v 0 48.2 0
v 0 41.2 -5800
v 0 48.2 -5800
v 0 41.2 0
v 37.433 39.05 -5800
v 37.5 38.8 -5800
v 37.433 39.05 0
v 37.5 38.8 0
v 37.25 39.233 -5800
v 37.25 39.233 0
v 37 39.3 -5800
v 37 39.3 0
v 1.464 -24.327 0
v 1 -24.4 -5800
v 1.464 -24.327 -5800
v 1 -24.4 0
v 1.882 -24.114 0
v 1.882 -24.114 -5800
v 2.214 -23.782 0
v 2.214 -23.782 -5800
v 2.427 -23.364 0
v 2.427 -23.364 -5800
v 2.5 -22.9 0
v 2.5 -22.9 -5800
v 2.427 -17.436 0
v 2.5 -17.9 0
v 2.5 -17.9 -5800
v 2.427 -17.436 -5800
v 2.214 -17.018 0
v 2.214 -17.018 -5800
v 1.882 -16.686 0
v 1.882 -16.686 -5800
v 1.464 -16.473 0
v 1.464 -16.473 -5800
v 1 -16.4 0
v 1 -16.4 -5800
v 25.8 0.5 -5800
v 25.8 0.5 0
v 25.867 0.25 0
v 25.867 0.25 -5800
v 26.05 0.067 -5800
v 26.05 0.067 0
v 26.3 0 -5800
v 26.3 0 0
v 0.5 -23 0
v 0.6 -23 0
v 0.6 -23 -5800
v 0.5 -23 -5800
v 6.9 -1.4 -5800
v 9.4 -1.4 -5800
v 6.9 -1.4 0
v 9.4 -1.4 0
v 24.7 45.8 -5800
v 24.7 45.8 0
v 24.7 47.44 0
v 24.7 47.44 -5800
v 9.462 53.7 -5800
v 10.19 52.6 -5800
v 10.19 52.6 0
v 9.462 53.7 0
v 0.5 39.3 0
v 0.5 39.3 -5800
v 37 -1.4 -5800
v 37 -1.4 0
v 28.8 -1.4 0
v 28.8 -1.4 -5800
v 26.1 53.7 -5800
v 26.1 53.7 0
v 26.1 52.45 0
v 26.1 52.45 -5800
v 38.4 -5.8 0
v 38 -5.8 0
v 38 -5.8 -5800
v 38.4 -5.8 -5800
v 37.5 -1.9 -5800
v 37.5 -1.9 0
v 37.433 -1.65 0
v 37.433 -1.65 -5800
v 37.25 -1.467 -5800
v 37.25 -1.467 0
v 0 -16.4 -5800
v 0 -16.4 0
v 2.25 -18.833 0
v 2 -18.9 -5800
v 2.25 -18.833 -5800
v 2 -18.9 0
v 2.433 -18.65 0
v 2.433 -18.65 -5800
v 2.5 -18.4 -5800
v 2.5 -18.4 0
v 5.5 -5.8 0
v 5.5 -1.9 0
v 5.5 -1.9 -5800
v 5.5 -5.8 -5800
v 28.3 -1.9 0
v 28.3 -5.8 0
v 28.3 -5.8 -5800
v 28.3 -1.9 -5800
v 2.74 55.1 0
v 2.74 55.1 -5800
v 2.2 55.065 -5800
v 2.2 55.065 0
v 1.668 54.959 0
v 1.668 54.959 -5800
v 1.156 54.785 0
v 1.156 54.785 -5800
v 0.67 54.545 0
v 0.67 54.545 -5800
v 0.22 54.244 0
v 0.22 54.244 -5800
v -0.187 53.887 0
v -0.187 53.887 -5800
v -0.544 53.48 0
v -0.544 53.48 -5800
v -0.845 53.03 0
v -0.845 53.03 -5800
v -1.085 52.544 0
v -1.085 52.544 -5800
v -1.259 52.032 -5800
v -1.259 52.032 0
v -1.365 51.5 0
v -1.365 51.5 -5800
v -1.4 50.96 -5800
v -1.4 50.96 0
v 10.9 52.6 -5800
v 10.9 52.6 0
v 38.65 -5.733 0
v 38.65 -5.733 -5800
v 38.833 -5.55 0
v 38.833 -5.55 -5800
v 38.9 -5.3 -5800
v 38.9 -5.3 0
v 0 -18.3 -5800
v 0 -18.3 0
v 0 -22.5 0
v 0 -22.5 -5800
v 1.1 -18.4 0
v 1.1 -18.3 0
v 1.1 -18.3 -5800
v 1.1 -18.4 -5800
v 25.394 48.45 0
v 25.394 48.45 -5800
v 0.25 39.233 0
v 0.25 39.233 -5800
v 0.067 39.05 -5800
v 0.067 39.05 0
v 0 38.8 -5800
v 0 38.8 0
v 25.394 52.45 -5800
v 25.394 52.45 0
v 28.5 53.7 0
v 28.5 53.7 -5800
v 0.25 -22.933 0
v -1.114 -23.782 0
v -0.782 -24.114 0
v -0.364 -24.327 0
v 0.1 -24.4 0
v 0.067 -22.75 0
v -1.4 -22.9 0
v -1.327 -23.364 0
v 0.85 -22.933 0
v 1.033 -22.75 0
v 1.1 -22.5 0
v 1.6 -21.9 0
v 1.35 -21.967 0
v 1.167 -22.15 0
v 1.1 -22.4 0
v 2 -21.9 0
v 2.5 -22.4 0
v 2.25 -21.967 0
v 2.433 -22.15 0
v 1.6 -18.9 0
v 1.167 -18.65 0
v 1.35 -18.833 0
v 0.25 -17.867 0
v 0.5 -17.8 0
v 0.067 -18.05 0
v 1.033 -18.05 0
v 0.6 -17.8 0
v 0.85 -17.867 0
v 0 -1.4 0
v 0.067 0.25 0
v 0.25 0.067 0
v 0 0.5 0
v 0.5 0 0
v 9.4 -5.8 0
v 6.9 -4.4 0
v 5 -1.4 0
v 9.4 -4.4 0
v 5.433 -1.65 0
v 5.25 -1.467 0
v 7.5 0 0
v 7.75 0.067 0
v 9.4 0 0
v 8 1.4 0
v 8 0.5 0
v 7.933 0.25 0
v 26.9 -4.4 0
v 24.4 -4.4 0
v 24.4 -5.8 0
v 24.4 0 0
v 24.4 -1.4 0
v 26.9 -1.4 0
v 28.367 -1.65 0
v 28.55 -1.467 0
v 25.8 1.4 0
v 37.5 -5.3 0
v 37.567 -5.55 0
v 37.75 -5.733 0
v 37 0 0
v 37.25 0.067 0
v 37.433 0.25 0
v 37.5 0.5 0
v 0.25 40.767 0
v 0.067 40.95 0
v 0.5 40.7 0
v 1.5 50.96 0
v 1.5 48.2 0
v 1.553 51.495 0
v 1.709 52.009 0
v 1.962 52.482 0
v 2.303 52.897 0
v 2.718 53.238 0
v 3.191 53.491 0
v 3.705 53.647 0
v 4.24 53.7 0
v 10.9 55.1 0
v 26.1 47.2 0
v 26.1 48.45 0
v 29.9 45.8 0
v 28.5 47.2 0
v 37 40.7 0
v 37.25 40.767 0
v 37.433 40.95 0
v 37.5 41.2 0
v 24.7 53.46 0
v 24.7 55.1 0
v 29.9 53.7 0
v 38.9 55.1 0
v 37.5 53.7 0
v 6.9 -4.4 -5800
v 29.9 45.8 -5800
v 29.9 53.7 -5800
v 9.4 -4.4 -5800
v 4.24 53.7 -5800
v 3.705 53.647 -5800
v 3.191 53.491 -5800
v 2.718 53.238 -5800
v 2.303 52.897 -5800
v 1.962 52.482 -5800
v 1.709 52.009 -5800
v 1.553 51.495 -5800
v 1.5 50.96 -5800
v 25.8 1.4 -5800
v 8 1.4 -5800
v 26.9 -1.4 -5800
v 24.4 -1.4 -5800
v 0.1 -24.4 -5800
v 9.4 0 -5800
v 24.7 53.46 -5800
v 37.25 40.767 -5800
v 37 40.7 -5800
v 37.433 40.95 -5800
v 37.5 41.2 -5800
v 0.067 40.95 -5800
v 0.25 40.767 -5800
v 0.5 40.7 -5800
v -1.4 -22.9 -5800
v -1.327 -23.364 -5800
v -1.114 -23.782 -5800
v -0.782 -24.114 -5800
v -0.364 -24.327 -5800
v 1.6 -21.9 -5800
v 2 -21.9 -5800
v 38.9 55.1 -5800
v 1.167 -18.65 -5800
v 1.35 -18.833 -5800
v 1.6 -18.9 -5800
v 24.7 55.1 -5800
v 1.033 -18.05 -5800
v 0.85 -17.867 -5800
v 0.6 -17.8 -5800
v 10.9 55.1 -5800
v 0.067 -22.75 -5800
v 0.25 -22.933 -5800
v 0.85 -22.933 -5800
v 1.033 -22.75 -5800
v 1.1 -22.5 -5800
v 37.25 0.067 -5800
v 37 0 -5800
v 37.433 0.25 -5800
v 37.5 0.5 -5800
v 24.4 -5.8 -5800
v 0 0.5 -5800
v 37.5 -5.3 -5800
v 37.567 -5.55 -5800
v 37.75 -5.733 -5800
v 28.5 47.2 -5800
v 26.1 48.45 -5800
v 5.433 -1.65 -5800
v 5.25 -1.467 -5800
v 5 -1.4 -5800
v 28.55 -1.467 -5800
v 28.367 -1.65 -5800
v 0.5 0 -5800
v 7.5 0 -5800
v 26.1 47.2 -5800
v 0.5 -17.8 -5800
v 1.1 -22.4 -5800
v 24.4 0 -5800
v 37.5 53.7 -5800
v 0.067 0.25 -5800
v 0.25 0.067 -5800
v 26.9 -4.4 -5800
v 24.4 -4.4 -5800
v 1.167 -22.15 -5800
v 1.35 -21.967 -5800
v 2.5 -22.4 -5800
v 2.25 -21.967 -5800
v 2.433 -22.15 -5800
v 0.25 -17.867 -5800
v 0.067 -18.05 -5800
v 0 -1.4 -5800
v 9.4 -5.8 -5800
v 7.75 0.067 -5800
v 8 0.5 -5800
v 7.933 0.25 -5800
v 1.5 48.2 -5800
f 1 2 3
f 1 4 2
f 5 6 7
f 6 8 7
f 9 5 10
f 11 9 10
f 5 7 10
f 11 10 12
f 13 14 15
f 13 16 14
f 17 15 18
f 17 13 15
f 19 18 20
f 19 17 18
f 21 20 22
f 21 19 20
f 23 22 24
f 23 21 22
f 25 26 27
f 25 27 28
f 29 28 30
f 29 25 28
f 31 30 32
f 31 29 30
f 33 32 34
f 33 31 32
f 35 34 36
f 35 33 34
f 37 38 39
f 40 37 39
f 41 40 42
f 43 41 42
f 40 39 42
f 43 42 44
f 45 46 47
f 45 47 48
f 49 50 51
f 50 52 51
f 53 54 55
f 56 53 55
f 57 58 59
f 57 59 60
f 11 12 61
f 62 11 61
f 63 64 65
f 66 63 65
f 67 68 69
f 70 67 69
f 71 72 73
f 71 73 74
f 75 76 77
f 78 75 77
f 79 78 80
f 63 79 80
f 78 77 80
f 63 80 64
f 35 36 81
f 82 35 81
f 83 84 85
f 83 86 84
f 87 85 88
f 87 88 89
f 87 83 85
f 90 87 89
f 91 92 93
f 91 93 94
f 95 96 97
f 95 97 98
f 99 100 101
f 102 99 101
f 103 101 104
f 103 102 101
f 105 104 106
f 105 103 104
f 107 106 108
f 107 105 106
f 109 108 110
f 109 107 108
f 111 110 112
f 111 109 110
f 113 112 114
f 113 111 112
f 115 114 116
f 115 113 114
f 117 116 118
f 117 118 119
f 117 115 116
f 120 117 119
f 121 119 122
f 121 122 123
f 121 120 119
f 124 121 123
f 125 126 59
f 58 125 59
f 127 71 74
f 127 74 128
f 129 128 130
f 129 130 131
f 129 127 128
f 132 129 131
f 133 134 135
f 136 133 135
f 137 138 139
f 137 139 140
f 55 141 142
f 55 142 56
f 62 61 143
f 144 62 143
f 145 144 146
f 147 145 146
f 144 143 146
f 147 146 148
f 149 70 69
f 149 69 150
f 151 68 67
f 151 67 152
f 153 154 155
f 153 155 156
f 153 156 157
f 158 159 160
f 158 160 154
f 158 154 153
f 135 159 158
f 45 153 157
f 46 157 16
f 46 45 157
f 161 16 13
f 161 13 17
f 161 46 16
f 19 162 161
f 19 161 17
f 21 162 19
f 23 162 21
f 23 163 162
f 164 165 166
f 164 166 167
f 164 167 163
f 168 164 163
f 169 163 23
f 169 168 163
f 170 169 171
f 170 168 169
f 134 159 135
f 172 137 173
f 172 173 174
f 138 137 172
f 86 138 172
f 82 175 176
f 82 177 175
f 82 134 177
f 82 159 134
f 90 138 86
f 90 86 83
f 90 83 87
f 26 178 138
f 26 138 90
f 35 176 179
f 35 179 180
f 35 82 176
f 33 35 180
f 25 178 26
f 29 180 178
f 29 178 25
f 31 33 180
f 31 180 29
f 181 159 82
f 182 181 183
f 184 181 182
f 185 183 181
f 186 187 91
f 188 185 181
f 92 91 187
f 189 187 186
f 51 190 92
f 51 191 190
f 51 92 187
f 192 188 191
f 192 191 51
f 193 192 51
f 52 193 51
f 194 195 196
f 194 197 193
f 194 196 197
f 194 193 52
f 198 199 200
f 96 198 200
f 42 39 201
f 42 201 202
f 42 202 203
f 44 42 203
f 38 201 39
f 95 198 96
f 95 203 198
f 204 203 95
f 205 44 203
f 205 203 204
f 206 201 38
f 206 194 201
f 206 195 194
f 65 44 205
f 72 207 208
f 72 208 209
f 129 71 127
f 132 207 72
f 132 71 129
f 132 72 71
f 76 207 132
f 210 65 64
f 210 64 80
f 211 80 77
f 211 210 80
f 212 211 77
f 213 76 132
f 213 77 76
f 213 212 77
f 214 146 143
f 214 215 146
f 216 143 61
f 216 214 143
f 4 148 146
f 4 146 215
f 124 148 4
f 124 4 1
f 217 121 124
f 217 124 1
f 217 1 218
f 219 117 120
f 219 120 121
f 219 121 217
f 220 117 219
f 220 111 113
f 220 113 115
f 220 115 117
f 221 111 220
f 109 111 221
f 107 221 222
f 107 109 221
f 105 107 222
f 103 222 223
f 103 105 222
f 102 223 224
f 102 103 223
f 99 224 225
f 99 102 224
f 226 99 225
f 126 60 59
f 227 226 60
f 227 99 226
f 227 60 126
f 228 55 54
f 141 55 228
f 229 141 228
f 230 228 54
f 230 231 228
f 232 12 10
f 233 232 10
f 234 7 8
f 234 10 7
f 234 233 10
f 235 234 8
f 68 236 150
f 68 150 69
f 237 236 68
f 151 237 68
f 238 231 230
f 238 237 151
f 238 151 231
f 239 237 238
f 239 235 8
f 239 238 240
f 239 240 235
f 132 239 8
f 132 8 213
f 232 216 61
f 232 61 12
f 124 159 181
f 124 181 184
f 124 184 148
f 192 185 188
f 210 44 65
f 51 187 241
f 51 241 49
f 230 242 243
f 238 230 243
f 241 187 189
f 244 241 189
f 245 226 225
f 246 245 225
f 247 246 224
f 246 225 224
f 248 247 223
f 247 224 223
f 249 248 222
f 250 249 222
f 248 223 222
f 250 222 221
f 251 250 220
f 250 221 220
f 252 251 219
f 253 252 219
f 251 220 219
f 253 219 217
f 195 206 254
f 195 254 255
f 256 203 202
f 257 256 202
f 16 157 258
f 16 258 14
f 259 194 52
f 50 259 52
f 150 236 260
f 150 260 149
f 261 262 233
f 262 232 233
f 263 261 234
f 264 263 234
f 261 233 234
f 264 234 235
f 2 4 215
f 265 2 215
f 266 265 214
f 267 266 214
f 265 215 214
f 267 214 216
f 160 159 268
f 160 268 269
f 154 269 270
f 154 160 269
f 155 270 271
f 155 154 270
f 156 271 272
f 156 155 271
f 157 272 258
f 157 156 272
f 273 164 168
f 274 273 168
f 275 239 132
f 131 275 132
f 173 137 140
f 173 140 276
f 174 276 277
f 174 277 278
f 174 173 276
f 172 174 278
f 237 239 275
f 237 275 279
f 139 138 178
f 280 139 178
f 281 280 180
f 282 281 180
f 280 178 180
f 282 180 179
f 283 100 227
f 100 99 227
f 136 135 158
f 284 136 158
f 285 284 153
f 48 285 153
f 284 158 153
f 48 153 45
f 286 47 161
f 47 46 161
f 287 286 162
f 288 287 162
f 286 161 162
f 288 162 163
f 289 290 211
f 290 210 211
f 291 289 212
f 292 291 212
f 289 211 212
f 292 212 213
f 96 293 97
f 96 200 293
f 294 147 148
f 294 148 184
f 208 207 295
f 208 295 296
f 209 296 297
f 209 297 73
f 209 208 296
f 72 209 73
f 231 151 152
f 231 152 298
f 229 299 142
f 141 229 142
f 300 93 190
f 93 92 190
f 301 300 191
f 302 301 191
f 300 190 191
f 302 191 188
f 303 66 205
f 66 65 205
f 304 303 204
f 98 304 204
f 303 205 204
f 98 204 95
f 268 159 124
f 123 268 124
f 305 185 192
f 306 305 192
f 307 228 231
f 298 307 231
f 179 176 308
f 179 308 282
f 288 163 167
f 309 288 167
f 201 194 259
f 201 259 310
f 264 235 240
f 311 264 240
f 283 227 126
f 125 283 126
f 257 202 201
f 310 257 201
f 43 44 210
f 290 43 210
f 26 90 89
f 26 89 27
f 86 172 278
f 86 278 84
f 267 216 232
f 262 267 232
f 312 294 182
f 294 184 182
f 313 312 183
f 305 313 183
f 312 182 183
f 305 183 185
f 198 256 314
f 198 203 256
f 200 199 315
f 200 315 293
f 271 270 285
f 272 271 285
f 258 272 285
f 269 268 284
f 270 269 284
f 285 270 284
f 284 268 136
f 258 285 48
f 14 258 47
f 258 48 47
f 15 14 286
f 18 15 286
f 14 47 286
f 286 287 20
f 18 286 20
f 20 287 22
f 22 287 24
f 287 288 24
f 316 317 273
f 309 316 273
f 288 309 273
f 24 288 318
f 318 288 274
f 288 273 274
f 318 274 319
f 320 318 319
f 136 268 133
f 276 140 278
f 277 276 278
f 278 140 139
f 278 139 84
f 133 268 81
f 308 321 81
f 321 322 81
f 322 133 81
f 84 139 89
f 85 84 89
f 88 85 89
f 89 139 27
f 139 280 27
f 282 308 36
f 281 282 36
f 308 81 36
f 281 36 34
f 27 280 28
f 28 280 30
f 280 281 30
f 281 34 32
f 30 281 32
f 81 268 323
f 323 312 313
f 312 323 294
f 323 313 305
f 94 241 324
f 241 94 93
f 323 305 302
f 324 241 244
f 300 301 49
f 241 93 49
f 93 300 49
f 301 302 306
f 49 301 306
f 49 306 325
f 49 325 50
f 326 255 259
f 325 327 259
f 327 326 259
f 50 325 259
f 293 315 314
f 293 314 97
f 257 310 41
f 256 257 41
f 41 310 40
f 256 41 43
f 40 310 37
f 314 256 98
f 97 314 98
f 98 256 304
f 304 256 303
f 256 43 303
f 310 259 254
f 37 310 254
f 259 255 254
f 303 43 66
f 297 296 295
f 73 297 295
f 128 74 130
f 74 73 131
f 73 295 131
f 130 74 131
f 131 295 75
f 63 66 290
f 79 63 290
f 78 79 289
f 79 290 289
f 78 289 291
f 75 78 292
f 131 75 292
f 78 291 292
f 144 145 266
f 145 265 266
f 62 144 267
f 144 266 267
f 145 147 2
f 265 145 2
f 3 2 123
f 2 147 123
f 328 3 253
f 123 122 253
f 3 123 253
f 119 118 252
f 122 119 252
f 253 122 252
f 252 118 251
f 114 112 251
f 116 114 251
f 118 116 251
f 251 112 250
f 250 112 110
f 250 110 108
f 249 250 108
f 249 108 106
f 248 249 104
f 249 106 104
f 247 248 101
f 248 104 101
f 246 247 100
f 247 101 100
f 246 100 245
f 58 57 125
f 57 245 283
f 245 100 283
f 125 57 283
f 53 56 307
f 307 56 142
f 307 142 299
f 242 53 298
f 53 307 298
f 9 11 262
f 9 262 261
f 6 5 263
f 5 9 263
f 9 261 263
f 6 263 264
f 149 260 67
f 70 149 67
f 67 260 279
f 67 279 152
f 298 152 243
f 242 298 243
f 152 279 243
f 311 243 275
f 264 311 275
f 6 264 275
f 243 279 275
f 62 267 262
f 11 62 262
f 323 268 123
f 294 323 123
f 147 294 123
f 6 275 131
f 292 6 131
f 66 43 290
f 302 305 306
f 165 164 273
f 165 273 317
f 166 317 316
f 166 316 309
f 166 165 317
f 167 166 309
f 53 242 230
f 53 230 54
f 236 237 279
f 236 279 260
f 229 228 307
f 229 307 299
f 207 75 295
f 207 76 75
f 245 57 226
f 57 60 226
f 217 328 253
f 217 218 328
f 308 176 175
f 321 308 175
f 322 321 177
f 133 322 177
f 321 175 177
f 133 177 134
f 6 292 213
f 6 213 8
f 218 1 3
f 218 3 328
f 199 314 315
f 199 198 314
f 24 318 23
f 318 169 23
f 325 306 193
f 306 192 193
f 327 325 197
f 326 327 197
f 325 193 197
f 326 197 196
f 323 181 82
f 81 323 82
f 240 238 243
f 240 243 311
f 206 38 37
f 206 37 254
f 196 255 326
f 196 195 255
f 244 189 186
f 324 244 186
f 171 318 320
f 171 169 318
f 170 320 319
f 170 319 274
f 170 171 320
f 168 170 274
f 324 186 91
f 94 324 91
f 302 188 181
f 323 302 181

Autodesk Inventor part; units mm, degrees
ref_plane "YZ Plane" through (0, 0, 0) normal (1, 0, 0) x (0, 1, 0)
ref_plane "XZ Plane" through (0, 0, 0) normal (0, 1, 0) x (-1, 0, 0)
ref_plane "XY Plane" through (0, 0, 0) normal (0, 0, 1) x (1, 0, 0)
sketch "Boceto1" plane through (0, 0, 0) normal (0, 0, 1) x (1, 0, 0)
  line L0 (37.5, 0.5) -> (37.5, 38.8)
  line L1 (37, 39.3) -> (0.5, 39.3)
  line L2 (0, 38.8) -> (0, 0.5)
  line L3 (0.5, 40.7) -> (37, 40.7)
  line L4 (38.9, 55.1) -> (38.9, -5.3)
  line L5 (-1.4, -22.9) -> (-1.4, 50.96)
  line L6 (37.5, 41.2) -> (37.5, 53.7)
  line L7 (38.9, 55.1) -> (24.7, 55.1)
  line L8 (24.7, 55.1) -> (24.7, 53.46)
  line L9 (28.5, 53.7) -> (28.5, 47.2)
  line L10 (29.9, 45.8) -> (29.9, 53.7)
  line L11 (29.9, 45.8) -> (24.7, 45.8)
  line L12 (24.7, 45.8) -> (24.7, 47.44)
  line L13 (26.1, 47.2) -> (28.5, 47.2)
  line L14 (26.1, 48.45) -> (25.3942, 48.45)
  line L15 (25.3942, 48.45) -> (24.7, 47.44)
  line L16 (26.1, 52.45) -> (25.3942, 52.45)
  line L17 (0, 41.2) -> (0, 48.2)
  line L18 (0, 48.2) -> (1.5, 48.2)
  line L19 (1.5, 48.2) -> (1.5, 50.96)
  line L20 (2.74, 55.1) -> (10.9, 55.1)
  line L21 (9.4619, 53.7) -> (4.24, 53.7)
  line L22 (10.9, 55.1) -> (10.9, 52.6)
  line L23 (10.9, 52.6) -> (10.19, 52.6)
  line L24 (10.19, 52.6) -> (9.4619, 53.7)
  line L25 (0, -24.4) -> (0.1, -24.4)
  line L26 (37.5, -1.9) -> (37.5, -5.3)
  line L27 (38, -5.8) -> (38.4, -5.8)
  line L28 (26.9, -1.4) -> (26.9, -4.4)
  line L29 (28.3, -5.8) -> (28.3, -1.9)
  line L30 (5.5, -1.9) -> (5.5, -5.8)
  line L31 (6.9, -4.4) -> (6.9, -1.4)
  line L32 (6.9, -4.4) -> (9.4, -4.4)
  line L33 (9.4, -4.4) -> (9.4, -5.8)
  line L34 (9.4, -5.8) -> (5.5, -5.8)
  line L35 (26.9, -4.4) -> (24.4, -4.4)
  line L36 (24.4, -4.4) -> (24.4, -5.8)
  line L37 (24.4, -5.8) -> (28.3, -5.8)
  line L38 (25.8, 0.5) -> (25.8, 1.4)
  line L39 (25.8, 1.4) -> (8, 1.4)
  line L40 (0.5, 0) -> (7.5, 0)
  line L41 (26.3, 0) -> (37, 0)
  line L42 (24.4, -1.4) -> (24.4, 0)
  line L43 (9.4, 0) -> (9.4, -1.4)
  line L44 (26.1, 53.7) -> (28.5, 53.7)
  line L45 (29.9, 53.7) -> (37.5, 53.7)
  line L46 (37, -1.4) -> (28.8, -1.4)
  line L47 (9.4, -1.4) -> (6.9, -1.4)
  line L48 (5, -1.4) -> (0, -1.4)
  arc A0 (4.24, 53.7) -> (1.5, 50.96) centre (4.24, 50.96) ccw
  arc A1 (2.74, 55.1) -> (-1.4, 50.96) centre (2.74, 50.96) ccw
  line L49 (26.9, -1.4) -> (24.4, -1.4)
  line L50 (26.9, -1.4) -> (24.4, -1.4)
  line L51 (8, 1.4) -> (8, 0.5)
  line L52 (9.4, 0) -> (24.4, 0)
  line L53 (24.7, 53.46) -> (25.3942, 52.45)
  line L54 (26.1, 53.7) -> (26.1, 52.45)
  line L55 (26.1, 47.2) -> (26.1, 48.45)
  line L56 (0, -24.4) -> (1, -24.4)
  line L57 (0.6, -23) -> (0.5, -23)
  line L58 (0.5, -17.8) -> (0.6, -17.8)
  line L59 (1, -16.4) -> (0, -16.4)
  line L60 (1.1, -18.3) -> (1.1, -18.4)
  line L61 (1.6, -18.9) -> (2, -18.9)
  line L62 (2.5, -18.4) -> (2.5, -17.9)
  line L63 (1.1, -22.5) -> (1.1, -22.4)
  line L64 (1.6, -21.9) -> (2, -21.9)
  line L65 (2.5, -22.4) -> (2.5, -22.9)
  line L66 (0, -1.4) -> (0, -16.4)
  line L67 (0, -18.3) -> (0, -22.5)
  arc A2 (2.5, -17.9) -> (1, -16.4) centre (1, -17.9) ccw
  arc A3 (1, -24.4) -> (2.5, -22.9) centre (1, -22.9) ccw
  arc A4 (-1.4, -22.9) -> (0.1, -24.4) centre (0.1, -22.9) ccw
  arc A5 (1.1, -18.4) -> (1.6, -18.9) centre (1.6, -18.4) ccw
  arc A6 (1.1, -18.3) -> (0.6, -17.8) centre (0.6, -18.3) ccw
  arc A7 (2, -18.9) -> (2.5, -18.4) centre (2, -18.4) ccw
  arc A8 (2.5, -22.4) -> (2, -21.9) centre (2, -22.4) ccw
  arc A9 (1.6, -21.9) -> (1.1, -22.4) centre (1.6, -22.4) ccw
  arc A10 (0.6, -23) -> (1.1, -22.5) centre (0.6, -22.5) ccw
  arc A11 (5.5, -1.9) -> (5, -1.4) centre (5, -1.9) ccw
  arc A12 (7.5, 0) -> (8, 0.5) centre (7.5, 0.5) ccw
  arc A13 (0, 0.5) -> (0.5, 0) centre (0.5, 0.5) ccw
  arc A14 (28.8, -1.4) -> (28.3, -1.9) centre (28.8, -1.9) ccw
  arc A15 (25.8, 0.5) -> (26.3, 0) centre (26.3, 0.5) ccw
  arc A16 (37, 0) -> (37.5, 0.5) centre (37, 0.5) ccw
  arc A17 (37.5, -1.9) -> (37, -1.4) centre (37, -1.9) ccw
  arc A18 (37.5, -5.3) -> (38, -5.8) centre (38, -5.3) ccw
  arc A19 (38.4, -5.8) -> (38.9, -5.3) centre (38.4, -5.3) ccw
  arc A20 (0.5, 39.3) -> (0, 38.8) centre (0.5, 38.8) ccw
  arc A21 (37.5, 38.8) -> (37, 39.3) centre (37, 38.8) ccw
  arc A22 (37, 40.7) -> (37.5, 41.2) centre (37, 41.2) ccw
  arc A23 (0, 41.2) -> (0.5, 40.7) centre (0.5, 41.2) ccw
  arc A24 (0, -22.5) -> (0.5, -23) centre (0.5, -22.5) ccw
  arc A25 (0.5, -17.8) -> (0, -18.3) centre (0.5, -18.3) ccw
  point P0 (0, 0)
  point P1 (9.4, -5.1)
  point P2 (27.3, 45.8)
  point P3 (28.5, 50.45)
  point P4 (0, -23)
  point P5 (0, -17.8)
  point P6 (1.1, -21.9)
  point P7 (0, -20.4)
  dimension "d10" = 60.9
  dimension "d11" = 23
  dimension "d13" = 39.3
  dimension "d14" = 1.4
  dimension "d15" = 1.4
  dimension "d17" = 1.4
  dimension "d18" = 1.4
  dimension "d20" = 1.4
  dimension "d22" = 1.4
  dimension "d23" = 1.4
  dimension "d26" = 1.4
  dimension "d27" = 1.4
  dimension "d28" = 1.4
  dimension "d31" = 1.4
  dimension "d34" = 40.3
  dimension "d35" = 37.9
  dimension "d36" = 39.3
  dimension "d37" = 37.5
  dimension "d38" = 37.5
  dimension "d40" = 14.2
  dimension "d41" = 13.8
  dimension "d42" = 2.5
  dimension "d43" = 0.71
  dimension "d45" = 2.9
  dimension "d46" = 14.4
  dimension "d47" = 33.5
  dimension "d48" = 7.5
  dimension "d49" = 79.5
  dimension "d51" = 2.74
  dimension "d58" = 4.14
  dimension "d59" = 6.9
  dimension "d60" = 1.4
  dimension "d61" = 20
  dimension "d62" = 6.9
  dimension "d64" = 1.4
  dimension "d65" = 3
  dimension "d66" = 3
  dimension "d68" = 2.5
  dimension "d69" = 2.5
  dimension "d70" = 15
  dimension "d71" = 2.5
  dimension "d73" = 1.4
  dimension "d74" = 1.4
  dimension "d75" = 1.4
  dimension "d76" = 1.4
  dimension "d82" = 1.4
  dimension "d83" = 1.4
  dimension "d84" = 1.4
  dimension "d85" = 1.4
  dimension "d86" = 1.4
  dimension "d88" = 2.4
  dimension "d95" = 6.02
  dimension "d99" = 111
  dimension "d100" = 2.4
  dimension "d109" = 0.7058
  dimension "d110" = 0.7058
  dimension "d112" = 5.2
  dimension "d115" = 2.6
  dimension "d116" = 2.6
  dimension "d117" = 1.5
  dimension "d118" = 1.5
  dimension "d119" = 3
  dimension "d120" = 1.4
  dimension "d121" = 1.4
extrude "Extrusión1" add sketch "Boceto1" against normal blind 5800
properties part number "SP40-02 HOJA PUERTA BATIENTE INT - EXT" material "Aluminio"
